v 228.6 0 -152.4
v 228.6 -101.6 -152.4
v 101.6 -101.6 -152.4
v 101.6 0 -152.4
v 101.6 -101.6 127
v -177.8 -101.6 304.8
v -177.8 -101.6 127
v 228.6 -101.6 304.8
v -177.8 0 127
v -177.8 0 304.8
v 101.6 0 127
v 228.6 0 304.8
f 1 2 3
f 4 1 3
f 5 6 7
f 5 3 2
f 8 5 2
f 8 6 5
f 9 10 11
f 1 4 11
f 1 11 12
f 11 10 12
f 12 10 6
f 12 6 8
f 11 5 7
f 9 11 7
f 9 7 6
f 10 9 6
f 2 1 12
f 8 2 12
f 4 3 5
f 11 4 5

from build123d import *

# Parameters (mm, degrees)
F0_W     = 457.2
F0_H     = 609.6
F1_DEPTH = 101.6
F3_DEPTH = 101.6


with BuildPart() as f1:
    # F0 (on Front) → F1 (new body)
    with BuildSketch(Plane.XZ):
        Rectangle(F0_W, F0_H)
    extrude(amount=F1_DEPTH)

    # F2 (on face) → F3 (cut, through all)
    with BuildSketch(Plane.XZ.offset(101.6)):
        Polygon((101.6, 127), (-177.8, 127), (-177.8, 304.8), (-228.6, 304.8), (-228.6, 127), (-228.6, -304.8), (101.6, -304.8), (228.6, -304.8), (228.6, -152.4), (101.6, -152.4), align=None)
    extrude(amount=-F3_DEPTH, mode=Mode.SUBTRACT)


solid = f1.part
